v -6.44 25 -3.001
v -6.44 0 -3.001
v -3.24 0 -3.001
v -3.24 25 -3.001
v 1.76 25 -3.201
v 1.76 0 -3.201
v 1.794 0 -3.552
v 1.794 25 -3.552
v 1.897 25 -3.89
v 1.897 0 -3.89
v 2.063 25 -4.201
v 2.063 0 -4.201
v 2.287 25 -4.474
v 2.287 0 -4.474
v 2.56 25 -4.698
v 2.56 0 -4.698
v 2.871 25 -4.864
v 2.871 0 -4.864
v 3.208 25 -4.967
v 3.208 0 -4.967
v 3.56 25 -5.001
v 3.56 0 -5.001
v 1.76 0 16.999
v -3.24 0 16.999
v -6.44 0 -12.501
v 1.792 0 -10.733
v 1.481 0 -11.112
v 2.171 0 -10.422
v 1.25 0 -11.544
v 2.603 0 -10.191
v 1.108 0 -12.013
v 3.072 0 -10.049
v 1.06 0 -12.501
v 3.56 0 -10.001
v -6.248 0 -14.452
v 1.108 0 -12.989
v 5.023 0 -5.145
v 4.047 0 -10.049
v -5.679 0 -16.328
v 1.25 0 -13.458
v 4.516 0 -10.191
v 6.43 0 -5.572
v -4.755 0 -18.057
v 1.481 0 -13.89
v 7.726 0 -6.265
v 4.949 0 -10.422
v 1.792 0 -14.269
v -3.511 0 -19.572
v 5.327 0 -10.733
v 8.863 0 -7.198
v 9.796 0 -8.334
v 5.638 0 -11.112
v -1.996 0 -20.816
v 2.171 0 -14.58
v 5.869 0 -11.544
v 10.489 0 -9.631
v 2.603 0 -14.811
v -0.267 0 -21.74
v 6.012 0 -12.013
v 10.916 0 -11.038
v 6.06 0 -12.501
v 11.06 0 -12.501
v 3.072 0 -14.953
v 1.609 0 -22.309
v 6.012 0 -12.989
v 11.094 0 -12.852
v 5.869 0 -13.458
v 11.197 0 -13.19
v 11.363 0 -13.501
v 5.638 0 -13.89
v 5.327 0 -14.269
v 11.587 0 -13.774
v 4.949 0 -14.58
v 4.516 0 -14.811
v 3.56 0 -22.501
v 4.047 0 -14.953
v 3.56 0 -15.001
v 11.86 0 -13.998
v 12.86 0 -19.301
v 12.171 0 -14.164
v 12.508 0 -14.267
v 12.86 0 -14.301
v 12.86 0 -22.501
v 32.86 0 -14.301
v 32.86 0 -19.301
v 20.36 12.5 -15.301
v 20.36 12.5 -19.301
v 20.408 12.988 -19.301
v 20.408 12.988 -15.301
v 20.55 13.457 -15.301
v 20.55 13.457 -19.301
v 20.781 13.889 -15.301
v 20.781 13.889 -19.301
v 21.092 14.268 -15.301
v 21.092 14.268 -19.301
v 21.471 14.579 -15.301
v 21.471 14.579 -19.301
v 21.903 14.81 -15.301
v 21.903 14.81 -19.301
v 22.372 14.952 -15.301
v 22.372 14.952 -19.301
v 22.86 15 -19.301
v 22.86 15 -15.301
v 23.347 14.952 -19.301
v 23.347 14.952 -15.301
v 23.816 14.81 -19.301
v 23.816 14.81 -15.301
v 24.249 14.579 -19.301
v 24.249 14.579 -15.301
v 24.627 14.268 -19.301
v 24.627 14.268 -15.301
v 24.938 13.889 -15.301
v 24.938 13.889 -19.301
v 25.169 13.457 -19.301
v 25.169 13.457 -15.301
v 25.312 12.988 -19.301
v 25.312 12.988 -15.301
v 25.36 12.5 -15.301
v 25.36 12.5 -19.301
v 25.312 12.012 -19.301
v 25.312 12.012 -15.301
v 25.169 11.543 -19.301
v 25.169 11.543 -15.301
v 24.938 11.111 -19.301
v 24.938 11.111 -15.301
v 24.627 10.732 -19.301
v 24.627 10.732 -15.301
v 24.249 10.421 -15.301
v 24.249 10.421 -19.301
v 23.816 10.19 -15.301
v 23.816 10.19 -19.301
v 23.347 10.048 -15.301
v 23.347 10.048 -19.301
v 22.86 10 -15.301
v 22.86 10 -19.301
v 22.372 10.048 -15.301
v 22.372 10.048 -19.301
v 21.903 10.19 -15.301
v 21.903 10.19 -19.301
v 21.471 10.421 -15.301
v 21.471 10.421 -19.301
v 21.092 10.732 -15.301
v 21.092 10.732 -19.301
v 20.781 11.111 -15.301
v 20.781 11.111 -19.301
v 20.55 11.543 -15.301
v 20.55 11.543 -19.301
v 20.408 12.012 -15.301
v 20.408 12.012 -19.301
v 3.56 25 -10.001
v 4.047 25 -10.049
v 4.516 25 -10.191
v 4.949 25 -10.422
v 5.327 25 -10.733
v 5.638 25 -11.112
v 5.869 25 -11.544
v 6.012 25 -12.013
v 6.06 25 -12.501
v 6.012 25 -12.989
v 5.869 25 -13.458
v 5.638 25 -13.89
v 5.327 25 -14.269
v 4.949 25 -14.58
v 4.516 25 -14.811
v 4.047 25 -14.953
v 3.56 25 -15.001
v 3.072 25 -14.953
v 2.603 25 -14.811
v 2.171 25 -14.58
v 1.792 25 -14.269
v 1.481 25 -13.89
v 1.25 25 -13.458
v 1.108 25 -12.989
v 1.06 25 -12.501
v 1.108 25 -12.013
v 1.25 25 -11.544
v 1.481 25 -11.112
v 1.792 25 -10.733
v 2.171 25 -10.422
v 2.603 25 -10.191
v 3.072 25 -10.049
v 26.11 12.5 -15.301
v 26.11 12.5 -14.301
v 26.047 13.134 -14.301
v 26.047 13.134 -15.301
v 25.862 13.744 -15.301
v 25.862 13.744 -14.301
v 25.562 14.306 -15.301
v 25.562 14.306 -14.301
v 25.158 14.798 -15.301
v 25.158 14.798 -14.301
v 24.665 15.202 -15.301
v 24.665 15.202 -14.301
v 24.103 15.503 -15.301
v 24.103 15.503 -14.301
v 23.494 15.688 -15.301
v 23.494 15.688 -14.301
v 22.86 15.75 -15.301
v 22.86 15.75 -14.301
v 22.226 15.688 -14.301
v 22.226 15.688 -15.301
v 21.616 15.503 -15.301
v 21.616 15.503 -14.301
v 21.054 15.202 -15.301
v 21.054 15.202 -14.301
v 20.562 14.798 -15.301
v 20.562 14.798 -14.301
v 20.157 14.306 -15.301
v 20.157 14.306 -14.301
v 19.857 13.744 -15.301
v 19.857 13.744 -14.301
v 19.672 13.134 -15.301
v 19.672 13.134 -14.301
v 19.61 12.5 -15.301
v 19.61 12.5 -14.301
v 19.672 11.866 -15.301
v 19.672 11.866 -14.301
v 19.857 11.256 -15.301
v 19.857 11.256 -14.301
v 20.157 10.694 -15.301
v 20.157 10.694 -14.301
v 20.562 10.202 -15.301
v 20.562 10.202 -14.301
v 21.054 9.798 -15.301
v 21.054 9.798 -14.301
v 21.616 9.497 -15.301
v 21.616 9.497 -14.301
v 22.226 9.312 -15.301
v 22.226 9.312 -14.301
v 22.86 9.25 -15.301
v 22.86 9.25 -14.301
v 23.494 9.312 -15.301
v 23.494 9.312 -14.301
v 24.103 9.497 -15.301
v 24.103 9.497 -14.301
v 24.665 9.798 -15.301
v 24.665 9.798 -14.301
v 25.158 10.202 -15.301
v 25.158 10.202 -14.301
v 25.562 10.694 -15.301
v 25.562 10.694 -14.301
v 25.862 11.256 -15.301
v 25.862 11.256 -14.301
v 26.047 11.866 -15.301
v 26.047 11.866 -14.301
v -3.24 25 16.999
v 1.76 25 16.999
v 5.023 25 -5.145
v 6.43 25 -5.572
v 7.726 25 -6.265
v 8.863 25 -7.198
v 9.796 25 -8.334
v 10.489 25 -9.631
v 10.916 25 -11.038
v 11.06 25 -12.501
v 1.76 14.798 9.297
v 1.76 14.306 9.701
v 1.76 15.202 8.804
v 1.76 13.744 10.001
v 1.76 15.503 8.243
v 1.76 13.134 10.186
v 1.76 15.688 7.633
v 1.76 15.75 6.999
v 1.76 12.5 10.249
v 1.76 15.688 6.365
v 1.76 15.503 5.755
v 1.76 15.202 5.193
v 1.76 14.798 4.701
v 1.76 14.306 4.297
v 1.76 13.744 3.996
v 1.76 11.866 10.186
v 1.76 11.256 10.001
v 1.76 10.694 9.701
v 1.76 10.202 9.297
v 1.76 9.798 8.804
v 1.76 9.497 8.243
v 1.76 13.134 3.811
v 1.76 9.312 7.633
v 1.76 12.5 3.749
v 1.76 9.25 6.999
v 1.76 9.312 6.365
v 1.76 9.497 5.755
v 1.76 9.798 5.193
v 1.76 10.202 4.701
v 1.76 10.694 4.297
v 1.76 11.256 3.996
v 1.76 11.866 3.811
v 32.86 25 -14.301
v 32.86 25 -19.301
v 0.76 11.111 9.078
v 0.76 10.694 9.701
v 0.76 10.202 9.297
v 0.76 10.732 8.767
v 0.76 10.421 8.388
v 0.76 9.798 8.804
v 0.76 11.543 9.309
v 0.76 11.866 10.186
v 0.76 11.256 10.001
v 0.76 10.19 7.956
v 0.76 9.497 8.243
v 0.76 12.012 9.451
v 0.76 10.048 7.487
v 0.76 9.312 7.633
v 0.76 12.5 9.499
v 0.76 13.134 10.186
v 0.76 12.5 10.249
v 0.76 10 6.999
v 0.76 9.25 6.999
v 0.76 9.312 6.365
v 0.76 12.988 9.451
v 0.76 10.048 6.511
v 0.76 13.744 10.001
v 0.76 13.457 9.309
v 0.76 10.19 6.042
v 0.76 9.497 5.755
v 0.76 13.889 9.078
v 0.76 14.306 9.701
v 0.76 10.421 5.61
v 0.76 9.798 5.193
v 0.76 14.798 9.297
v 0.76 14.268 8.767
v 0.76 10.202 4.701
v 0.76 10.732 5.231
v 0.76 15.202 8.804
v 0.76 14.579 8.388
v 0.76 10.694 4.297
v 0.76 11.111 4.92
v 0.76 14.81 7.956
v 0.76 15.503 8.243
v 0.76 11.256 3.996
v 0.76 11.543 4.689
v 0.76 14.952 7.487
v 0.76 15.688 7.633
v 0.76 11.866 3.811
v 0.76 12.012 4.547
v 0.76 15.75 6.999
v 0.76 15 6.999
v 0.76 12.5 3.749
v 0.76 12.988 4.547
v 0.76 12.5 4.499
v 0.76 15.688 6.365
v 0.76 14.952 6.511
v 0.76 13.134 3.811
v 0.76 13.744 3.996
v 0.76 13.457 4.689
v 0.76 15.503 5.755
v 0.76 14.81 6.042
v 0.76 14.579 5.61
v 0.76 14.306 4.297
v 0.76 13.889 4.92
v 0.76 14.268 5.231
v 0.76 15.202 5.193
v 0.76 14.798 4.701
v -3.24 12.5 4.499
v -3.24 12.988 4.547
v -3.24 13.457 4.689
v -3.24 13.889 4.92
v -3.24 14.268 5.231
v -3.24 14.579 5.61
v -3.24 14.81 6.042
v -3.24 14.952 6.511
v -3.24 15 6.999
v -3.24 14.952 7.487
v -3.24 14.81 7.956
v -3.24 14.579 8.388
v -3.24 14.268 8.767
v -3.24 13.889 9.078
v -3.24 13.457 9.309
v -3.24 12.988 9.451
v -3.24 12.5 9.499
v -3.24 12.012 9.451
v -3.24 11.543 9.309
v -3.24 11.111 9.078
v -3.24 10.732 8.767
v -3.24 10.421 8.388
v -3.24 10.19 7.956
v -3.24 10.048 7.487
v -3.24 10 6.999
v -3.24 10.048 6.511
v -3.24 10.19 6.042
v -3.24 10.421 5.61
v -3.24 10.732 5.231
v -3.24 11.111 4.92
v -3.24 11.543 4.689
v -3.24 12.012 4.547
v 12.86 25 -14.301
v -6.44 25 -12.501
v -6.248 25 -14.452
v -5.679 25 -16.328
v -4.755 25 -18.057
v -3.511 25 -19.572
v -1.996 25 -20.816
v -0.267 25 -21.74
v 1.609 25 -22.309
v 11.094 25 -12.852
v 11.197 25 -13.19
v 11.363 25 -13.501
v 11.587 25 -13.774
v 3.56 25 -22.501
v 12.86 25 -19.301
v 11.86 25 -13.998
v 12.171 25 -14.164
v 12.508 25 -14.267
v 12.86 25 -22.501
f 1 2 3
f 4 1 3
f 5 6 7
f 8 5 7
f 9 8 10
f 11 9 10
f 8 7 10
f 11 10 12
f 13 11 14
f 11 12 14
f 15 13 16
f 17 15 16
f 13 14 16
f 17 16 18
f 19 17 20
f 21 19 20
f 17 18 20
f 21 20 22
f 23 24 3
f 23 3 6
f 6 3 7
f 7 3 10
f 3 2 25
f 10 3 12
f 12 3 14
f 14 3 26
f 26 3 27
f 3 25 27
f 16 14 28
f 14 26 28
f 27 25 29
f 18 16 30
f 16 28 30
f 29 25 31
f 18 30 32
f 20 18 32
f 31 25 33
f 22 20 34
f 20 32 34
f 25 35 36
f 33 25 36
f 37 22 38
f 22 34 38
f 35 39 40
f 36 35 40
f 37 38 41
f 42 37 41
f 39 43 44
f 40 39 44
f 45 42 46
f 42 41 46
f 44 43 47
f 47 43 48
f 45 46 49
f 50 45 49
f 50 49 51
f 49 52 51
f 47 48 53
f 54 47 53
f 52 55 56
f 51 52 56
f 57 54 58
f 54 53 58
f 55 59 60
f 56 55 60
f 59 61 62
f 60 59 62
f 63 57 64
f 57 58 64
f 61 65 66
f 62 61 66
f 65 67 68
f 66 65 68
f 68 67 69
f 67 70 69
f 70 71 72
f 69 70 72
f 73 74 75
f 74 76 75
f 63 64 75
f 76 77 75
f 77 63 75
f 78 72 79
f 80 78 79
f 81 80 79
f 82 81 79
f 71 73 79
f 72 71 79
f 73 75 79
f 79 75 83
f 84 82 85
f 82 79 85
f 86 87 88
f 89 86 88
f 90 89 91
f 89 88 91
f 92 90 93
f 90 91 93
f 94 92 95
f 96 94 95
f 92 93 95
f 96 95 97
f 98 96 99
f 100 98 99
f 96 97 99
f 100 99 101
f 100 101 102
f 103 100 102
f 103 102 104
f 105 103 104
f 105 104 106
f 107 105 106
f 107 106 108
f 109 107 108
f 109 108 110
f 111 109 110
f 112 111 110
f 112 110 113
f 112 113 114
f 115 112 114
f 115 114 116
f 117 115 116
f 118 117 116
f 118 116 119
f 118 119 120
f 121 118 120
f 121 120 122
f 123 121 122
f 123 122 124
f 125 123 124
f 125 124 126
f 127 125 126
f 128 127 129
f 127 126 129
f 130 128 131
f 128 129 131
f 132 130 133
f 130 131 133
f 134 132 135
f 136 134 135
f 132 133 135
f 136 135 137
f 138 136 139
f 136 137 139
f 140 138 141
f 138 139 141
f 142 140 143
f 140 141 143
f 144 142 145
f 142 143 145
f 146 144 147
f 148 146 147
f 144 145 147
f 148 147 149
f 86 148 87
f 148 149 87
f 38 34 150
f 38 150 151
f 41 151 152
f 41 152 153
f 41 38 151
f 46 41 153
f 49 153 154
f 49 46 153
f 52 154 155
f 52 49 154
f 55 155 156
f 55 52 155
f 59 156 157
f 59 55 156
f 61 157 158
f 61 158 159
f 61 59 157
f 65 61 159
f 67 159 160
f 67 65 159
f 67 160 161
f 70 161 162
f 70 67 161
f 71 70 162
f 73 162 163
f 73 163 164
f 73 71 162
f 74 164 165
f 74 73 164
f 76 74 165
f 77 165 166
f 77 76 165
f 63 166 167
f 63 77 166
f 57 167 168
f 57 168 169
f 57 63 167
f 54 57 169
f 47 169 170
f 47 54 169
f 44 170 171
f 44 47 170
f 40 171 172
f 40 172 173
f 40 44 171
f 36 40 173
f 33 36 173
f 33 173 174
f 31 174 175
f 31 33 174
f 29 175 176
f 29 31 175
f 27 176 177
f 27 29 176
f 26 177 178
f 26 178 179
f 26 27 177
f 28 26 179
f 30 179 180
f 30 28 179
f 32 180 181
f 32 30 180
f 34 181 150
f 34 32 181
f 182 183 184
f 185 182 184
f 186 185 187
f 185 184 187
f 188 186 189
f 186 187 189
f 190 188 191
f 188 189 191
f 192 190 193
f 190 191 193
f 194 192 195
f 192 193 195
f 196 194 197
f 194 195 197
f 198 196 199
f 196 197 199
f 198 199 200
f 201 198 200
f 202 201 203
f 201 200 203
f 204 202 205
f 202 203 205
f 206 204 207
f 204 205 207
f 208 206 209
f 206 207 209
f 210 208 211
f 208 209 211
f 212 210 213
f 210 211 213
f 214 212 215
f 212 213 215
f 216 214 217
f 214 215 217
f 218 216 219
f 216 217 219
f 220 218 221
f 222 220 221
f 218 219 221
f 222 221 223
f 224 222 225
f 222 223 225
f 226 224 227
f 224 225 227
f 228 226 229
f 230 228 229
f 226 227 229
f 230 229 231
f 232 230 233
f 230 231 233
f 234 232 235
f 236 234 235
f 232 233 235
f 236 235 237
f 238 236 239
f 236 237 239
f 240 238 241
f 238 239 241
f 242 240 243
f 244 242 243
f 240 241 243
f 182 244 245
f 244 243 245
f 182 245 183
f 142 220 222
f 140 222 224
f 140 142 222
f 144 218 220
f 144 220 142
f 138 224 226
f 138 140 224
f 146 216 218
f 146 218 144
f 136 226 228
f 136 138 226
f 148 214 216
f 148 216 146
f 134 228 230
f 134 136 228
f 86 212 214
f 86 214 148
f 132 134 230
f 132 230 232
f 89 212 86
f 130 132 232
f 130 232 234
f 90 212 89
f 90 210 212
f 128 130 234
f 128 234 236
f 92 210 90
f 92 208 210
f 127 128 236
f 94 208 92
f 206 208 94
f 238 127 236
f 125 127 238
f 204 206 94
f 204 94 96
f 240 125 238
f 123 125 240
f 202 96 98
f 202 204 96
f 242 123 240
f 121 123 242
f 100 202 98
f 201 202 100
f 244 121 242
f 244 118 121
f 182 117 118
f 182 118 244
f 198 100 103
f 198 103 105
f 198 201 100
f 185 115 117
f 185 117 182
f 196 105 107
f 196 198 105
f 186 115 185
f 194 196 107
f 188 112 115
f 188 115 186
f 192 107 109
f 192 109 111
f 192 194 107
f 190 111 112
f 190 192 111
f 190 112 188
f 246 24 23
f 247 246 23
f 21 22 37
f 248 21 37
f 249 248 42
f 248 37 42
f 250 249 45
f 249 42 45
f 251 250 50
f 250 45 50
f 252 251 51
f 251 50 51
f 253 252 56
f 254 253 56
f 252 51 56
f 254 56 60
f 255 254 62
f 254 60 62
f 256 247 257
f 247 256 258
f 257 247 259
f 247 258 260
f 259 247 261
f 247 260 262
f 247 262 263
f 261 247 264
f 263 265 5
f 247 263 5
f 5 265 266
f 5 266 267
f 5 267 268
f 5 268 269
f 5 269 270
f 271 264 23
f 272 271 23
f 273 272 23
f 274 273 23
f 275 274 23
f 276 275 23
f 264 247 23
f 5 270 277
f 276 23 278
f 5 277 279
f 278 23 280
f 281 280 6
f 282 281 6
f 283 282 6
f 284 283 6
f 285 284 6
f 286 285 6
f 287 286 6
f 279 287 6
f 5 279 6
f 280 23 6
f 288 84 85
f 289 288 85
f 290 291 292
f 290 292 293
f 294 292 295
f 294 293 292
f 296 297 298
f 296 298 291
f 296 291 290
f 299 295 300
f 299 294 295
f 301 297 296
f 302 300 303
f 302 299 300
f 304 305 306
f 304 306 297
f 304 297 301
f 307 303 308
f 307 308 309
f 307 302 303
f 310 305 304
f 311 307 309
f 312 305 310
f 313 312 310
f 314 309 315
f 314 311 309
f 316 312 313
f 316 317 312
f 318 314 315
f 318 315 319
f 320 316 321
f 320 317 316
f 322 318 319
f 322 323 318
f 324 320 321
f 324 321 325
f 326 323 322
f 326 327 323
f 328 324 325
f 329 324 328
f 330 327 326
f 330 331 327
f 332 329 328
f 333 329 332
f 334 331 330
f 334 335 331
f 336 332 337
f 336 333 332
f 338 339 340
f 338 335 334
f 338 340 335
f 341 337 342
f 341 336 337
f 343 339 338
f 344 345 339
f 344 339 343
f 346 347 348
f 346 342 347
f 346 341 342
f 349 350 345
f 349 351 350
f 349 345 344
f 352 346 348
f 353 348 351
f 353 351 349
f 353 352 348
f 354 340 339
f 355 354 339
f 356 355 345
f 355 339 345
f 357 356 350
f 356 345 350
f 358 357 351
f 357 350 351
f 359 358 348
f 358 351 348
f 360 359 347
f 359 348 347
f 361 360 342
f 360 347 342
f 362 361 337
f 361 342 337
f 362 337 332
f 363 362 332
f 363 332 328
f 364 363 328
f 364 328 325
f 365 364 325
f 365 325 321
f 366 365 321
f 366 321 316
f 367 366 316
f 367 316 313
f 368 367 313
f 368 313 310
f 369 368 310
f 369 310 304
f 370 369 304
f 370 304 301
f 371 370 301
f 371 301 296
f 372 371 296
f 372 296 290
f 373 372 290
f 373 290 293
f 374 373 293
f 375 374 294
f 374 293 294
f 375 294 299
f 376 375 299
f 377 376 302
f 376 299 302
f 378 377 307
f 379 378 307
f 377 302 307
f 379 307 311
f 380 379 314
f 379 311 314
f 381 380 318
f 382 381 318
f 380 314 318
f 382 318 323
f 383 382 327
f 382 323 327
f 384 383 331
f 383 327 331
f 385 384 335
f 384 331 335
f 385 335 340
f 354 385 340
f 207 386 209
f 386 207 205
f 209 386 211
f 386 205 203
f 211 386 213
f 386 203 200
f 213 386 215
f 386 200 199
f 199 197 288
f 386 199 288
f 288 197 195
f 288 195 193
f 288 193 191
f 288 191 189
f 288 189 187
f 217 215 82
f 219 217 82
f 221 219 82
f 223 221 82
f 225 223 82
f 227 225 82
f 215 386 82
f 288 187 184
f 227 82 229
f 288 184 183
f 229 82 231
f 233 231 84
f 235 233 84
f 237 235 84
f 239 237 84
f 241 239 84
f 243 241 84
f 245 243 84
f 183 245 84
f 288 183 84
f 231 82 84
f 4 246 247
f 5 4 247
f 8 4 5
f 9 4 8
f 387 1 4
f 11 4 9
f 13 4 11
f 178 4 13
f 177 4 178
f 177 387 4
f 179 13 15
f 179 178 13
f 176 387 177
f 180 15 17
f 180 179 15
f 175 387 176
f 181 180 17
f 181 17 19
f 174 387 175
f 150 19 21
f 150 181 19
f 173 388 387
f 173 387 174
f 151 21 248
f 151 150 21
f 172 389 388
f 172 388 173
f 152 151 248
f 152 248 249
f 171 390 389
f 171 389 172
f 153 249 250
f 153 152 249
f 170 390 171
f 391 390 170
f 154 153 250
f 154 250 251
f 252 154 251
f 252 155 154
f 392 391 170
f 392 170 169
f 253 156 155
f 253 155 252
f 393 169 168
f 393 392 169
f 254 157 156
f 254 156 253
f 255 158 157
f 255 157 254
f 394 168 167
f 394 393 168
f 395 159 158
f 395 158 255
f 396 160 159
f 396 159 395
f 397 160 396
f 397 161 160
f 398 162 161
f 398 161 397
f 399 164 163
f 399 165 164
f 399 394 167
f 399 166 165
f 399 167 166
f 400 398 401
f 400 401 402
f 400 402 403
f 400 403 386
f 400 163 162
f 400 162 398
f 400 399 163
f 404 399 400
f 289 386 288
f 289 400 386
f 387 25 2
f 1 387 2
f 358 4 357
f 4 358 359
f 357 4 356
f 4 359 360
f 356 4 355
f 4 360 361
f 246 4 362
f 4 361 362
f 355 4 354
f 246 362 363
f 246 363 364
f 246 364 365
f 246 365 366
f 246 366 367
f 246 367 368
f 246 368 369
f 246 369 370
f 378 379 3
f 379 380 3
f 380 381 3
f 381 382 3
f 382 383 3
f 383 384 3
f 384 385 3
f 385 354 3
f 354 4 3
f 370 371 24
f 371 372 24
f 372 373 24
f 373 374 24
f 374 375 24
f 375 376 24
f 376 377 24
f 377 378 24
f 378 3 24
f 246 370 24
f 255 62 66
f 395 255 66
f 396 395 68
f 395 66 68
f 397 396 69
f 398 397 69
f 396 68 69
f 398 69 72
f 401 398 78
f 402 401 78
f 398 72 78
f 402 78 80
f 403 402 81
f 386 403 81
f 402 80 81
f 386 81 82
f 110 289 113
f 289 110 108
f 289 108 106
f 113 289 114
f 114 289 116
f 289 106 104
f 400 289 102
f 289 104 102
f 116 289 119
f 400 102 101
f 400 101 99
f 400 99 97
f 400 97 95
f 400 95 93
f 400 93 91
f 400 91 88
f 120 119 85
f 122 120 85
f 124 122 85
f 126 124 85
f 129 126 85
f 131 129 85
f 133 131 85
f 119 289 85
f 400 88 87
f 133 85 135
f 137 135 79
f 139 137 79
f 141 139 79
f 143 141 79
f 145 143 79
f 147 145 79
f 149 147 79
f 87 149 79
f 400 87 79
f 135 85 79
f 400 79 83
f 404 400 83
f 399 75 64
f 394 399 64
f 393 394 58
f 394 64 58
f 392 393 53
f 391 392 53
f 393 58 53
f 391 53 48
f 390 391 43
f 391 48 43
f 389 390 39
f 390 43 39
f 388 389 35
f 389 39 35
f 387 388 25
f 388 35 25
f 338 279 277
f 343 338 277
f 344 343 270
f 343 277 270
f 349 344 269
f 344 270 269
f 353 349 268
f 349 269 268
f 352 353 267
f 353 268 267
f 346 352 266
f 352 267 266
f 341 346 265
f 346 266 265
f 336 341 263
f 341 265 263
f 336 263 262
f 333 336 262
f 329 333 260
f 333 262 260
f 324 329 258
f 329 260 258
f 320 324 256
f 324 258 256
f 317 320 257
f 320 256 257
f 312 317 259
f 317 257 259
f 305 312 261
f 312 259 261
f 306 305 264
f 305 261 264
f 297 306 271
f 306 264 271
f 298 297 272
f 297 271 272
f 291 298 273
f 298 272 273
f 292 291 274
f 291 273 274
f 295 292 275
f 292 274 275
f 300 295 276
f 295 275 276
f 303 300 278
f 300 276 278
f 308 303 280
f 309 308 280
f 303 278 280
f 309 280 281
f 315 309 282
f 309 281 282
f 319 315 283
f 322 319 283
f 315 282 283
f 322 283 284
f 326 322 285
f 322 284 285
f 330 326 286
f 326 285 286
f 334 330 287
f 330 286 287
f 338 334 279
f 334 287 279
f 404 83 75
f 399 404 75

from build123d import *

# Parameters (mm, degrees)
SKETCH4_R           = 2.5
BOSS_EXTRUDE1_DEPTH = 25
SKETCH5_R           = 2.5
CUT_EXTRUDE1_DEPTH  = 55.976783394
SKETCH6_R           = 3.25
CUT_EXTRUDE2_DEPTH  = 1
SKETCH7_R           = 2.5
CUT_EXTRUDE3_DEPTH  = 46.809522816
SKETCH8_R           = 3.25
CUT_EXTRUDE4_DEPTH  = 1


with BuildPart() as part:
    # Sketch4 → Boss-Extrude1 (new body)
    with BuildSketch(Plane(origin=(0, 0, 0), x_dir=(1, 0, 0), z_dir=(0, 1, 0))):
        with BuildLine():
            Line((12.859651739, 14.301163983), (32.859651739, 14.301163983))
            Line((32.859651739, 14.301163983), (32.859651739, 19.301163983))
            Line((32.859651739, 19.301163983), (12.859651739, 19.301163983))
            Line((12.859651739, 19.301163983), (12.859651739, 22.501163983))
            Line((12.859651739, 22.501163983), (3.559651739, 22.501163983))
            ThreePointArc((3.559651739, 22.501163983), (-3.511416073, 19.572231795), (-6.440348261, 12.501163983))
            Line((-6.440348261, 12.501163983), (-6.440348261, 3.001163983))
            Line((-6.440348261, 3.001163983), (-3.240348261, 3.001163983))
            Line((-3.240348261, 3.001163983), (-3.240348261, -16.998836017))
            Line((-3.240348261, -16.998836017), (1.759651739, -16.998836017))
            Line((1.759651739, -16.998836017), (1.759651739, 3.201163983))
            ThreePointArc((1.759651739, 3.201163983), (2.286859533, 4.473956189), (3.559651739, 5.001163983))
            ThreePointArc((3.559651739, 5.001163983), (8.862952598, 7.197863124), (11.059651739, 12.501163983))
            ThreePointArc((11.059651739, 12.501163983), (11.586859533, 13.773956189), (12.859651739, 14.301163983))
        make_face()
        with Locations(Location((3.559651739, 12.501163983, 0), (0, 0, 270))):
            Circle(SKETCH4_R, mode=Mode.SUBTRACT)
    extrude(amount=BOSS_EXTRUDE1_DEPTH)

    # Sketch5 → Cut-Extrude1 (cut, through all)
    with BuildSketch(Plane(origin=(0, 0, -19.301163983), x_dir=(-1, 0, 0), z_dir=(0, 0, -1))):
        with Locations((-22.859651739, 12.5)):
            Circle(SKETCH5_R)
    extrude(amount=-CUT_EXTRUDE1_DEPTH, mode=Mode.SUBTRACT)

    # Sketch6 → Cut-Extrude2 (cut)
    with BuildSketch(Plane.XY.offset(-14.301163983)):
        with Locations((22.859651739, 12.5)):
            Circle(SKETCH6_R)
    extrude(amount=-CUT_EXTRUDE2_DEPTH, mode=Mode.SUBTRACT)

    # Sketch7 → Cut-Extrude3 (cut, through all)
    with BuildSketch(Plane(origin=(1.759651739, 0, 0), x_dir=(0, 0, -1), z_dir=(1, 0, 0))):
        with Locations((-6.998836017, 12.5)):
            Circle(SKETCH7_R)
    extrude(amount=-CUT_EXTRUDE3_DEPTH, mode=Mode.SUBTRACT)

    # Sketch8 → Cut-Extrude4 (cut)
    with BuildSketch(Plane(origin=(1.759651739, 0, 0), x_dir=(0, 0, -1), z_dir=(1, 0, 0))):
        with Locations((-6.998836017, 12.5)):
            Circle(SKETCH8_R)
    extrude(amount=-CUT_EXTRUDE4_DEPTH, mode=Mode.SUBTRACT)


solid = part.part
